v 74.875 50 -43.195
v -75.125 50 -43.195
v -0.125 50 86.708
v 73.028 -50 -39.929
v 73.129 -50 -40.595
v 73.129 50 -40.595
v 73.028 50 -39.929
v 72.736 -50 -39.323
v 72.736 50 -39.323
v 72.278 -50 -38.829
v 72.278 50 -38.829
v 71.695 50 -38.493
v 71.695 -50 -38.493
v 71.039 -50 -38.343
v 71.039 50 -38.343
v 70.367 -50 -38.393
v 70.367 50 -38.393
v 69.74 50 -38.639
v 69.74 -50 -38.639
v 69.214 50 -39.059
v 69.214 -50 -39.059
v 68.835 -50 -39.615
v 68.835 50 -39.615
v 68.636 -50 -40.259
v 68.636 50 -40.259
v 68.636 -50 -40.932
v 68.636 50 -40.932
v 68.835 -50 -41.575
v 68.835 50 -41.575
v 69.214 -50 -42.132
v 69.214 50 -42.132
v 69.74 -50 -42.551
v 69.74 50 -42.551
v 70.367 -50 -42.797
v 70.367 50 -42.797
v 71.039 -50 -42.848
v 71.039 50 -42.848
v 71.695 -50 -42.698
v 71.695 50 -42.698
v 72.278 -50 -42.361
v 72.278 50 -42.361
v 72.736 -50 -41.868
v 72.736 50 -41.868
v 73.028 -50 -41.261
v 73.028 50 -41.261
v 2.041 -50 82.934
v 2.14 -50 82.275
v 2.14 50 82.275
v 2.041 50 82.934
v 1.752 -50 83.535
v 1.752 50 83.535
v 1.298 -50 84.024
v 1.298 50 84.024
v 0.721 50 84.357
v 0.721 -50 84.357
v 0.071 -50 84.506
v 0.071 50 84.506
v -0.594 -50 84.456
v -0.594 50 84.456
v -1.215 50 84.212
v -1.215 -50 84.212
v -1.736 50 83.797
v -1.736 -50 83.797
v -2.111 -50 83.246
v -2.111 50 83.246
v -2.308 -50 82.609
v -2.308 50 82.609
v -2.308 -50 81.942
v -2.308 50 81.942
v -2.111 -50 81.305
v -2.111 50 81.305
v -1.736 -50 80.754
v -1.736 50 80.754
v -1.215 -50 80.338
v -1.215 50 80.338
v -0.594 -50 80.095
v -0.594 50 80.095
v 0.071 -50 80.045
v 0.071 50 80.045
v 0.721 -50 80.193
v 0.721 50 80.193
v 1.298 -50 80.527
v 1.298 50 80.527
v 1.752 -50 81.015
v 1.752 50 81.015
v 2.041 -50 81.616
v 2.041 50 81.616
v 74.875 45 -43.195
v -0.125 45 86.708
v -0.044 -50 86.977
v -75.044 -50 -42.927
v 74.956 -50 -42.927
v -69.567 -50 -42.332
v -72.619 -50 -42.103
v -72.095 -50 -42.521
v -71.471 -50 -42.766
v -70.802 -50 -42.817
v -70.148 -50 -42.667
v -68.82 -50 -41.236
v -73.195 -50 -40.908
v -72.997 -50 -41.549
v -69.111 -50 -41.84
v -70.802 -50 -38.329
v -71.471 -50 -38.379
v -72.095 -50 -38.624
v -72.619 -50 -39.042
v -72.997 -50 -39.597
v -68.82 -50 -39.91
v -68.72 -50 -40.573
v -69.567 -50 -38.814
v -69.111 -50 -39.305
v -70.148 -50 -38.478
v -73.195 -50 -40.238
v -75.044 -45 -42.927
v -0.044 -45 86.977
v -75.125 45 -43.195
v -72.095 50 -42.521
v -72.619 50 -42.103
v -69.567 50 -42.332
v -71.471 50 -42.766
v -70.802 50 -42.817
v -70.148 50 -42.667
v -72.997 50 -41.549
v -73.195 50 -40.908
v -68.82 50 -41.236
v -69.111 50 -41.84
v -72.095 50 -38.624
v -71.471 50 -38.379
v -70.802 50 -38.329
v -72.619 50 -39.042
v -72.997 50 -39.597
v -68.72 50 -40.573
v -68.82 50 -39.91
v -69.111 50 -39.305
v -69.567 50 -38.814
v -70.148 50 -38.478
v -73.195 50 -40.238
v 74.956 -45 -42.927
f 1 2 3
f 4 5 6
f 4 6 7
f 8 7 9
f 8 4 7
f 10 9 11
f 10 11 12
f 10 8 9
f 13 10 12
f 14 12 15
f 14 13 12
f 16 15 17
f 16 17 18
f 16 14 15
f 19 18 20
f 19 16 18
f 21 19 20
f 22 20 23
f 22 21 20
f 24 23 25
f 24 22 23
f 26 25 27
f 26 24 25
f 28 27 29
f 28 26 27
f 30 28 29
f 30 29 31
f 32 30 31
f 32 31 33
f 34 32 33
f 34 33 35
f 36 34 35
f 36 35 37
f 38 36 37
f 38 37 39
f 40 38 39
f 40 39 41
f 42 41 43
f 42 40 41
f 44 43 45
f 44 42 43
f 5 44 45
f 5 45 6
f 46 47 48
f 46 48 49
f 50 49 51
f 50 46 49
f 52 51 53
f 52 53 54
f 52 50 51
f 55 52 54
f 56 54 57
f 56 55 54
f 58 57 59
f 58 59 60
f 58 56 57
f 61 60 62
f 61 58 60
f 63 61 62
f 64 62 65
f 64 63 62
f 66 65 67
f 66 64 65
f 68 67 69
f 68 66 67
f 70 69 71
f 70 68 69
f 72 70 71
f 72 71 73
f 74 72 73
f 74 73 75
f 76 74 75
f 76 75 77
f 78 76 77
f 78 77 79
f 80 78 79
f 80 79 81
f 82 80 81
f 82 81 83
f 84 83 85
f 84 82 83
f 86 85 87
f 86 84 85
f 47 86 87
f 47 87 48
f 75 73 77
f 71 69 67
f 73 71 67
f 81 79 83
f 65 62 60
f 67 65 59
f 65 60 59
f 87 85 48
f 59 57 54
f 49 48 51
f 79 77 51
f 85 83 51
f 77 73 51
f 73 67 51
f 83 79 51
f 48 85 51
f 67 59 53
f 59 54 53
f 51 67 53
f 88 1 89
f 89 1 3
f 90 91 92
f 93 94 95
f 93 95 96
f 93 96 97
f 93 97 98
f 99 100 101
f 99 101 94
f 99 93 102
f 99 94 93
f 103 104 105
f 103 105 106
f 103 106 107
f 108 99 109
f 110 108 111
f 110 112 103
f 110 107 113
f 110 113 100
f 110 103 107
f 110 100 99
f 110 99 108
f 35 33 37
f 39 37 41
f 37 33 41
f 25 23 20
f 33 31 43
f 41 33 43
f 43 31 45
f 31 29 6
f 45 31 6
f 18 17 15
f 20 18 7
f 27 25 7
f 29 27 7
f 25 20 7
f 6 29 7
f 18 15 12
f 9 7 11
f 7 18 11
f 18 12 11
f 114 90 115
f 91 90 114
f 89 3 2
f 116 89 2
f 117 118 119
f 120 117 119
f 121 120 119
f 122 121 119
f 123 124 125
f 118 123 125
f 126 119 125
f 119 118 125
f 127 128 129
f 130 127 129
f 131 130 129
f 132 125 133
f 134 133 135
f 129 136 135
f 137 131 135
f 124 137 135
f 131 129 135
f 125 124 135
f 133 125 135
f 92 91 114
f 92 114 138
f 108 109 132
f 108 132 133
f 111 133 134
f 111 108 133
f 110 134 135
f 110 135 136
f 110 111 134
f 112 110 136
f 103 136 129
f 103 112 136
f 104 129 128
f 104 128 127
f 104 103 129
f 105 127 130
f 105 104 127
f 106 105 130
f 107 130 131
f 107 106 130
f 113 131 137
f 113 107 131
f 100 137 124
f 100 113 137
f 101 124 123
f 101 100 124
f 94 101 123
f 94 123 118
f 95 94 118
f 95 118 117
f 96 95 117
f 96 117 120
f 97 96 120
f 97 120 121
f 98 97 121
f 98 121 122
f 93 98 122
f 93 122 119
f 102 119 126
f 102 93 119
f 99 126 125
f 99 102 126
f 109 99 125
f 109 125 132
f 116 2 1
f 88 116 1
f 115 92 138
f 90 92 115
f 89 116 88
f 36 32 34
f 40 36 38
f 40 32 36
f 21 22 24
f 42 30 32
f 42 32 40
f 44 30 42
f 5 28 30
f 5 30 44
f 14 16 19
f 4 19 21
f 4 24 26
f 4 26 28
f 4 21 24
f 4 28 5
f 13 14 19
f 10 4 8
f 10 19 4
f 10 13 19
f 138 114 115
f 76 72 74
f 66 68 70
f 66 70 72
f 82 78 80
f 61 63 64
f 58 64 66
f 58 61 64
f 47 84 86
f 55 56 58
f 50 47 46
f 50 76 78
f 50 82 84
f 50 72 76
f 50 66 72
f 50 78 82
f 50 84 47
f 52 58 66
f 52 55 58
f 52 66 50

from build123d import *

# Parameters (mm, degrees)
F4_DEPTH = 5
F5_DEPTH = 5
F6_R     = 2.236629
F6_R_2   = 2.25
F6_R_3   = 2.258785
F7_DEPTH = 100


with BuildPart() as f4:
    # F2 (on offset) → F4 (new body)
    with BuildSketch(Plane.XZ.offset(50)):
        Polygon((-0.043742, 86.976736), (-75.043742, -42.927074), (74.956258, -42.927074), align=None)
    extrude(amount=-F4_DEPTH)


with BuildPart() as f5:
    # F3 (on offset) → F5 (new body)
    with BuildSketch(Plane.XZ.offset(-50)):
        Polygon((-0.125071, 86.708439), (-75.125071, -43.195372), (74.874929, -43.195372), align=None)
    extrude(amount=F5_DEPTH)


with BuildPart() as f7:
    # F6 (on offset) → F7 (new body)
    with BuildSketch(Plane.XZ.offset(50)):
        with Locations((-0.096302, 82.275233)):
            Circle(F6_R)
        with Locations((-70.970068, -40.572886)):
            Circle(F6_R_2)
        with Locations((70.869755, -40.595226)):
            Circle(F6_R_3)
    extrude(amount=-F7_DEPTH)


solid = Compound([f4.part, f5.part, f7.part])
